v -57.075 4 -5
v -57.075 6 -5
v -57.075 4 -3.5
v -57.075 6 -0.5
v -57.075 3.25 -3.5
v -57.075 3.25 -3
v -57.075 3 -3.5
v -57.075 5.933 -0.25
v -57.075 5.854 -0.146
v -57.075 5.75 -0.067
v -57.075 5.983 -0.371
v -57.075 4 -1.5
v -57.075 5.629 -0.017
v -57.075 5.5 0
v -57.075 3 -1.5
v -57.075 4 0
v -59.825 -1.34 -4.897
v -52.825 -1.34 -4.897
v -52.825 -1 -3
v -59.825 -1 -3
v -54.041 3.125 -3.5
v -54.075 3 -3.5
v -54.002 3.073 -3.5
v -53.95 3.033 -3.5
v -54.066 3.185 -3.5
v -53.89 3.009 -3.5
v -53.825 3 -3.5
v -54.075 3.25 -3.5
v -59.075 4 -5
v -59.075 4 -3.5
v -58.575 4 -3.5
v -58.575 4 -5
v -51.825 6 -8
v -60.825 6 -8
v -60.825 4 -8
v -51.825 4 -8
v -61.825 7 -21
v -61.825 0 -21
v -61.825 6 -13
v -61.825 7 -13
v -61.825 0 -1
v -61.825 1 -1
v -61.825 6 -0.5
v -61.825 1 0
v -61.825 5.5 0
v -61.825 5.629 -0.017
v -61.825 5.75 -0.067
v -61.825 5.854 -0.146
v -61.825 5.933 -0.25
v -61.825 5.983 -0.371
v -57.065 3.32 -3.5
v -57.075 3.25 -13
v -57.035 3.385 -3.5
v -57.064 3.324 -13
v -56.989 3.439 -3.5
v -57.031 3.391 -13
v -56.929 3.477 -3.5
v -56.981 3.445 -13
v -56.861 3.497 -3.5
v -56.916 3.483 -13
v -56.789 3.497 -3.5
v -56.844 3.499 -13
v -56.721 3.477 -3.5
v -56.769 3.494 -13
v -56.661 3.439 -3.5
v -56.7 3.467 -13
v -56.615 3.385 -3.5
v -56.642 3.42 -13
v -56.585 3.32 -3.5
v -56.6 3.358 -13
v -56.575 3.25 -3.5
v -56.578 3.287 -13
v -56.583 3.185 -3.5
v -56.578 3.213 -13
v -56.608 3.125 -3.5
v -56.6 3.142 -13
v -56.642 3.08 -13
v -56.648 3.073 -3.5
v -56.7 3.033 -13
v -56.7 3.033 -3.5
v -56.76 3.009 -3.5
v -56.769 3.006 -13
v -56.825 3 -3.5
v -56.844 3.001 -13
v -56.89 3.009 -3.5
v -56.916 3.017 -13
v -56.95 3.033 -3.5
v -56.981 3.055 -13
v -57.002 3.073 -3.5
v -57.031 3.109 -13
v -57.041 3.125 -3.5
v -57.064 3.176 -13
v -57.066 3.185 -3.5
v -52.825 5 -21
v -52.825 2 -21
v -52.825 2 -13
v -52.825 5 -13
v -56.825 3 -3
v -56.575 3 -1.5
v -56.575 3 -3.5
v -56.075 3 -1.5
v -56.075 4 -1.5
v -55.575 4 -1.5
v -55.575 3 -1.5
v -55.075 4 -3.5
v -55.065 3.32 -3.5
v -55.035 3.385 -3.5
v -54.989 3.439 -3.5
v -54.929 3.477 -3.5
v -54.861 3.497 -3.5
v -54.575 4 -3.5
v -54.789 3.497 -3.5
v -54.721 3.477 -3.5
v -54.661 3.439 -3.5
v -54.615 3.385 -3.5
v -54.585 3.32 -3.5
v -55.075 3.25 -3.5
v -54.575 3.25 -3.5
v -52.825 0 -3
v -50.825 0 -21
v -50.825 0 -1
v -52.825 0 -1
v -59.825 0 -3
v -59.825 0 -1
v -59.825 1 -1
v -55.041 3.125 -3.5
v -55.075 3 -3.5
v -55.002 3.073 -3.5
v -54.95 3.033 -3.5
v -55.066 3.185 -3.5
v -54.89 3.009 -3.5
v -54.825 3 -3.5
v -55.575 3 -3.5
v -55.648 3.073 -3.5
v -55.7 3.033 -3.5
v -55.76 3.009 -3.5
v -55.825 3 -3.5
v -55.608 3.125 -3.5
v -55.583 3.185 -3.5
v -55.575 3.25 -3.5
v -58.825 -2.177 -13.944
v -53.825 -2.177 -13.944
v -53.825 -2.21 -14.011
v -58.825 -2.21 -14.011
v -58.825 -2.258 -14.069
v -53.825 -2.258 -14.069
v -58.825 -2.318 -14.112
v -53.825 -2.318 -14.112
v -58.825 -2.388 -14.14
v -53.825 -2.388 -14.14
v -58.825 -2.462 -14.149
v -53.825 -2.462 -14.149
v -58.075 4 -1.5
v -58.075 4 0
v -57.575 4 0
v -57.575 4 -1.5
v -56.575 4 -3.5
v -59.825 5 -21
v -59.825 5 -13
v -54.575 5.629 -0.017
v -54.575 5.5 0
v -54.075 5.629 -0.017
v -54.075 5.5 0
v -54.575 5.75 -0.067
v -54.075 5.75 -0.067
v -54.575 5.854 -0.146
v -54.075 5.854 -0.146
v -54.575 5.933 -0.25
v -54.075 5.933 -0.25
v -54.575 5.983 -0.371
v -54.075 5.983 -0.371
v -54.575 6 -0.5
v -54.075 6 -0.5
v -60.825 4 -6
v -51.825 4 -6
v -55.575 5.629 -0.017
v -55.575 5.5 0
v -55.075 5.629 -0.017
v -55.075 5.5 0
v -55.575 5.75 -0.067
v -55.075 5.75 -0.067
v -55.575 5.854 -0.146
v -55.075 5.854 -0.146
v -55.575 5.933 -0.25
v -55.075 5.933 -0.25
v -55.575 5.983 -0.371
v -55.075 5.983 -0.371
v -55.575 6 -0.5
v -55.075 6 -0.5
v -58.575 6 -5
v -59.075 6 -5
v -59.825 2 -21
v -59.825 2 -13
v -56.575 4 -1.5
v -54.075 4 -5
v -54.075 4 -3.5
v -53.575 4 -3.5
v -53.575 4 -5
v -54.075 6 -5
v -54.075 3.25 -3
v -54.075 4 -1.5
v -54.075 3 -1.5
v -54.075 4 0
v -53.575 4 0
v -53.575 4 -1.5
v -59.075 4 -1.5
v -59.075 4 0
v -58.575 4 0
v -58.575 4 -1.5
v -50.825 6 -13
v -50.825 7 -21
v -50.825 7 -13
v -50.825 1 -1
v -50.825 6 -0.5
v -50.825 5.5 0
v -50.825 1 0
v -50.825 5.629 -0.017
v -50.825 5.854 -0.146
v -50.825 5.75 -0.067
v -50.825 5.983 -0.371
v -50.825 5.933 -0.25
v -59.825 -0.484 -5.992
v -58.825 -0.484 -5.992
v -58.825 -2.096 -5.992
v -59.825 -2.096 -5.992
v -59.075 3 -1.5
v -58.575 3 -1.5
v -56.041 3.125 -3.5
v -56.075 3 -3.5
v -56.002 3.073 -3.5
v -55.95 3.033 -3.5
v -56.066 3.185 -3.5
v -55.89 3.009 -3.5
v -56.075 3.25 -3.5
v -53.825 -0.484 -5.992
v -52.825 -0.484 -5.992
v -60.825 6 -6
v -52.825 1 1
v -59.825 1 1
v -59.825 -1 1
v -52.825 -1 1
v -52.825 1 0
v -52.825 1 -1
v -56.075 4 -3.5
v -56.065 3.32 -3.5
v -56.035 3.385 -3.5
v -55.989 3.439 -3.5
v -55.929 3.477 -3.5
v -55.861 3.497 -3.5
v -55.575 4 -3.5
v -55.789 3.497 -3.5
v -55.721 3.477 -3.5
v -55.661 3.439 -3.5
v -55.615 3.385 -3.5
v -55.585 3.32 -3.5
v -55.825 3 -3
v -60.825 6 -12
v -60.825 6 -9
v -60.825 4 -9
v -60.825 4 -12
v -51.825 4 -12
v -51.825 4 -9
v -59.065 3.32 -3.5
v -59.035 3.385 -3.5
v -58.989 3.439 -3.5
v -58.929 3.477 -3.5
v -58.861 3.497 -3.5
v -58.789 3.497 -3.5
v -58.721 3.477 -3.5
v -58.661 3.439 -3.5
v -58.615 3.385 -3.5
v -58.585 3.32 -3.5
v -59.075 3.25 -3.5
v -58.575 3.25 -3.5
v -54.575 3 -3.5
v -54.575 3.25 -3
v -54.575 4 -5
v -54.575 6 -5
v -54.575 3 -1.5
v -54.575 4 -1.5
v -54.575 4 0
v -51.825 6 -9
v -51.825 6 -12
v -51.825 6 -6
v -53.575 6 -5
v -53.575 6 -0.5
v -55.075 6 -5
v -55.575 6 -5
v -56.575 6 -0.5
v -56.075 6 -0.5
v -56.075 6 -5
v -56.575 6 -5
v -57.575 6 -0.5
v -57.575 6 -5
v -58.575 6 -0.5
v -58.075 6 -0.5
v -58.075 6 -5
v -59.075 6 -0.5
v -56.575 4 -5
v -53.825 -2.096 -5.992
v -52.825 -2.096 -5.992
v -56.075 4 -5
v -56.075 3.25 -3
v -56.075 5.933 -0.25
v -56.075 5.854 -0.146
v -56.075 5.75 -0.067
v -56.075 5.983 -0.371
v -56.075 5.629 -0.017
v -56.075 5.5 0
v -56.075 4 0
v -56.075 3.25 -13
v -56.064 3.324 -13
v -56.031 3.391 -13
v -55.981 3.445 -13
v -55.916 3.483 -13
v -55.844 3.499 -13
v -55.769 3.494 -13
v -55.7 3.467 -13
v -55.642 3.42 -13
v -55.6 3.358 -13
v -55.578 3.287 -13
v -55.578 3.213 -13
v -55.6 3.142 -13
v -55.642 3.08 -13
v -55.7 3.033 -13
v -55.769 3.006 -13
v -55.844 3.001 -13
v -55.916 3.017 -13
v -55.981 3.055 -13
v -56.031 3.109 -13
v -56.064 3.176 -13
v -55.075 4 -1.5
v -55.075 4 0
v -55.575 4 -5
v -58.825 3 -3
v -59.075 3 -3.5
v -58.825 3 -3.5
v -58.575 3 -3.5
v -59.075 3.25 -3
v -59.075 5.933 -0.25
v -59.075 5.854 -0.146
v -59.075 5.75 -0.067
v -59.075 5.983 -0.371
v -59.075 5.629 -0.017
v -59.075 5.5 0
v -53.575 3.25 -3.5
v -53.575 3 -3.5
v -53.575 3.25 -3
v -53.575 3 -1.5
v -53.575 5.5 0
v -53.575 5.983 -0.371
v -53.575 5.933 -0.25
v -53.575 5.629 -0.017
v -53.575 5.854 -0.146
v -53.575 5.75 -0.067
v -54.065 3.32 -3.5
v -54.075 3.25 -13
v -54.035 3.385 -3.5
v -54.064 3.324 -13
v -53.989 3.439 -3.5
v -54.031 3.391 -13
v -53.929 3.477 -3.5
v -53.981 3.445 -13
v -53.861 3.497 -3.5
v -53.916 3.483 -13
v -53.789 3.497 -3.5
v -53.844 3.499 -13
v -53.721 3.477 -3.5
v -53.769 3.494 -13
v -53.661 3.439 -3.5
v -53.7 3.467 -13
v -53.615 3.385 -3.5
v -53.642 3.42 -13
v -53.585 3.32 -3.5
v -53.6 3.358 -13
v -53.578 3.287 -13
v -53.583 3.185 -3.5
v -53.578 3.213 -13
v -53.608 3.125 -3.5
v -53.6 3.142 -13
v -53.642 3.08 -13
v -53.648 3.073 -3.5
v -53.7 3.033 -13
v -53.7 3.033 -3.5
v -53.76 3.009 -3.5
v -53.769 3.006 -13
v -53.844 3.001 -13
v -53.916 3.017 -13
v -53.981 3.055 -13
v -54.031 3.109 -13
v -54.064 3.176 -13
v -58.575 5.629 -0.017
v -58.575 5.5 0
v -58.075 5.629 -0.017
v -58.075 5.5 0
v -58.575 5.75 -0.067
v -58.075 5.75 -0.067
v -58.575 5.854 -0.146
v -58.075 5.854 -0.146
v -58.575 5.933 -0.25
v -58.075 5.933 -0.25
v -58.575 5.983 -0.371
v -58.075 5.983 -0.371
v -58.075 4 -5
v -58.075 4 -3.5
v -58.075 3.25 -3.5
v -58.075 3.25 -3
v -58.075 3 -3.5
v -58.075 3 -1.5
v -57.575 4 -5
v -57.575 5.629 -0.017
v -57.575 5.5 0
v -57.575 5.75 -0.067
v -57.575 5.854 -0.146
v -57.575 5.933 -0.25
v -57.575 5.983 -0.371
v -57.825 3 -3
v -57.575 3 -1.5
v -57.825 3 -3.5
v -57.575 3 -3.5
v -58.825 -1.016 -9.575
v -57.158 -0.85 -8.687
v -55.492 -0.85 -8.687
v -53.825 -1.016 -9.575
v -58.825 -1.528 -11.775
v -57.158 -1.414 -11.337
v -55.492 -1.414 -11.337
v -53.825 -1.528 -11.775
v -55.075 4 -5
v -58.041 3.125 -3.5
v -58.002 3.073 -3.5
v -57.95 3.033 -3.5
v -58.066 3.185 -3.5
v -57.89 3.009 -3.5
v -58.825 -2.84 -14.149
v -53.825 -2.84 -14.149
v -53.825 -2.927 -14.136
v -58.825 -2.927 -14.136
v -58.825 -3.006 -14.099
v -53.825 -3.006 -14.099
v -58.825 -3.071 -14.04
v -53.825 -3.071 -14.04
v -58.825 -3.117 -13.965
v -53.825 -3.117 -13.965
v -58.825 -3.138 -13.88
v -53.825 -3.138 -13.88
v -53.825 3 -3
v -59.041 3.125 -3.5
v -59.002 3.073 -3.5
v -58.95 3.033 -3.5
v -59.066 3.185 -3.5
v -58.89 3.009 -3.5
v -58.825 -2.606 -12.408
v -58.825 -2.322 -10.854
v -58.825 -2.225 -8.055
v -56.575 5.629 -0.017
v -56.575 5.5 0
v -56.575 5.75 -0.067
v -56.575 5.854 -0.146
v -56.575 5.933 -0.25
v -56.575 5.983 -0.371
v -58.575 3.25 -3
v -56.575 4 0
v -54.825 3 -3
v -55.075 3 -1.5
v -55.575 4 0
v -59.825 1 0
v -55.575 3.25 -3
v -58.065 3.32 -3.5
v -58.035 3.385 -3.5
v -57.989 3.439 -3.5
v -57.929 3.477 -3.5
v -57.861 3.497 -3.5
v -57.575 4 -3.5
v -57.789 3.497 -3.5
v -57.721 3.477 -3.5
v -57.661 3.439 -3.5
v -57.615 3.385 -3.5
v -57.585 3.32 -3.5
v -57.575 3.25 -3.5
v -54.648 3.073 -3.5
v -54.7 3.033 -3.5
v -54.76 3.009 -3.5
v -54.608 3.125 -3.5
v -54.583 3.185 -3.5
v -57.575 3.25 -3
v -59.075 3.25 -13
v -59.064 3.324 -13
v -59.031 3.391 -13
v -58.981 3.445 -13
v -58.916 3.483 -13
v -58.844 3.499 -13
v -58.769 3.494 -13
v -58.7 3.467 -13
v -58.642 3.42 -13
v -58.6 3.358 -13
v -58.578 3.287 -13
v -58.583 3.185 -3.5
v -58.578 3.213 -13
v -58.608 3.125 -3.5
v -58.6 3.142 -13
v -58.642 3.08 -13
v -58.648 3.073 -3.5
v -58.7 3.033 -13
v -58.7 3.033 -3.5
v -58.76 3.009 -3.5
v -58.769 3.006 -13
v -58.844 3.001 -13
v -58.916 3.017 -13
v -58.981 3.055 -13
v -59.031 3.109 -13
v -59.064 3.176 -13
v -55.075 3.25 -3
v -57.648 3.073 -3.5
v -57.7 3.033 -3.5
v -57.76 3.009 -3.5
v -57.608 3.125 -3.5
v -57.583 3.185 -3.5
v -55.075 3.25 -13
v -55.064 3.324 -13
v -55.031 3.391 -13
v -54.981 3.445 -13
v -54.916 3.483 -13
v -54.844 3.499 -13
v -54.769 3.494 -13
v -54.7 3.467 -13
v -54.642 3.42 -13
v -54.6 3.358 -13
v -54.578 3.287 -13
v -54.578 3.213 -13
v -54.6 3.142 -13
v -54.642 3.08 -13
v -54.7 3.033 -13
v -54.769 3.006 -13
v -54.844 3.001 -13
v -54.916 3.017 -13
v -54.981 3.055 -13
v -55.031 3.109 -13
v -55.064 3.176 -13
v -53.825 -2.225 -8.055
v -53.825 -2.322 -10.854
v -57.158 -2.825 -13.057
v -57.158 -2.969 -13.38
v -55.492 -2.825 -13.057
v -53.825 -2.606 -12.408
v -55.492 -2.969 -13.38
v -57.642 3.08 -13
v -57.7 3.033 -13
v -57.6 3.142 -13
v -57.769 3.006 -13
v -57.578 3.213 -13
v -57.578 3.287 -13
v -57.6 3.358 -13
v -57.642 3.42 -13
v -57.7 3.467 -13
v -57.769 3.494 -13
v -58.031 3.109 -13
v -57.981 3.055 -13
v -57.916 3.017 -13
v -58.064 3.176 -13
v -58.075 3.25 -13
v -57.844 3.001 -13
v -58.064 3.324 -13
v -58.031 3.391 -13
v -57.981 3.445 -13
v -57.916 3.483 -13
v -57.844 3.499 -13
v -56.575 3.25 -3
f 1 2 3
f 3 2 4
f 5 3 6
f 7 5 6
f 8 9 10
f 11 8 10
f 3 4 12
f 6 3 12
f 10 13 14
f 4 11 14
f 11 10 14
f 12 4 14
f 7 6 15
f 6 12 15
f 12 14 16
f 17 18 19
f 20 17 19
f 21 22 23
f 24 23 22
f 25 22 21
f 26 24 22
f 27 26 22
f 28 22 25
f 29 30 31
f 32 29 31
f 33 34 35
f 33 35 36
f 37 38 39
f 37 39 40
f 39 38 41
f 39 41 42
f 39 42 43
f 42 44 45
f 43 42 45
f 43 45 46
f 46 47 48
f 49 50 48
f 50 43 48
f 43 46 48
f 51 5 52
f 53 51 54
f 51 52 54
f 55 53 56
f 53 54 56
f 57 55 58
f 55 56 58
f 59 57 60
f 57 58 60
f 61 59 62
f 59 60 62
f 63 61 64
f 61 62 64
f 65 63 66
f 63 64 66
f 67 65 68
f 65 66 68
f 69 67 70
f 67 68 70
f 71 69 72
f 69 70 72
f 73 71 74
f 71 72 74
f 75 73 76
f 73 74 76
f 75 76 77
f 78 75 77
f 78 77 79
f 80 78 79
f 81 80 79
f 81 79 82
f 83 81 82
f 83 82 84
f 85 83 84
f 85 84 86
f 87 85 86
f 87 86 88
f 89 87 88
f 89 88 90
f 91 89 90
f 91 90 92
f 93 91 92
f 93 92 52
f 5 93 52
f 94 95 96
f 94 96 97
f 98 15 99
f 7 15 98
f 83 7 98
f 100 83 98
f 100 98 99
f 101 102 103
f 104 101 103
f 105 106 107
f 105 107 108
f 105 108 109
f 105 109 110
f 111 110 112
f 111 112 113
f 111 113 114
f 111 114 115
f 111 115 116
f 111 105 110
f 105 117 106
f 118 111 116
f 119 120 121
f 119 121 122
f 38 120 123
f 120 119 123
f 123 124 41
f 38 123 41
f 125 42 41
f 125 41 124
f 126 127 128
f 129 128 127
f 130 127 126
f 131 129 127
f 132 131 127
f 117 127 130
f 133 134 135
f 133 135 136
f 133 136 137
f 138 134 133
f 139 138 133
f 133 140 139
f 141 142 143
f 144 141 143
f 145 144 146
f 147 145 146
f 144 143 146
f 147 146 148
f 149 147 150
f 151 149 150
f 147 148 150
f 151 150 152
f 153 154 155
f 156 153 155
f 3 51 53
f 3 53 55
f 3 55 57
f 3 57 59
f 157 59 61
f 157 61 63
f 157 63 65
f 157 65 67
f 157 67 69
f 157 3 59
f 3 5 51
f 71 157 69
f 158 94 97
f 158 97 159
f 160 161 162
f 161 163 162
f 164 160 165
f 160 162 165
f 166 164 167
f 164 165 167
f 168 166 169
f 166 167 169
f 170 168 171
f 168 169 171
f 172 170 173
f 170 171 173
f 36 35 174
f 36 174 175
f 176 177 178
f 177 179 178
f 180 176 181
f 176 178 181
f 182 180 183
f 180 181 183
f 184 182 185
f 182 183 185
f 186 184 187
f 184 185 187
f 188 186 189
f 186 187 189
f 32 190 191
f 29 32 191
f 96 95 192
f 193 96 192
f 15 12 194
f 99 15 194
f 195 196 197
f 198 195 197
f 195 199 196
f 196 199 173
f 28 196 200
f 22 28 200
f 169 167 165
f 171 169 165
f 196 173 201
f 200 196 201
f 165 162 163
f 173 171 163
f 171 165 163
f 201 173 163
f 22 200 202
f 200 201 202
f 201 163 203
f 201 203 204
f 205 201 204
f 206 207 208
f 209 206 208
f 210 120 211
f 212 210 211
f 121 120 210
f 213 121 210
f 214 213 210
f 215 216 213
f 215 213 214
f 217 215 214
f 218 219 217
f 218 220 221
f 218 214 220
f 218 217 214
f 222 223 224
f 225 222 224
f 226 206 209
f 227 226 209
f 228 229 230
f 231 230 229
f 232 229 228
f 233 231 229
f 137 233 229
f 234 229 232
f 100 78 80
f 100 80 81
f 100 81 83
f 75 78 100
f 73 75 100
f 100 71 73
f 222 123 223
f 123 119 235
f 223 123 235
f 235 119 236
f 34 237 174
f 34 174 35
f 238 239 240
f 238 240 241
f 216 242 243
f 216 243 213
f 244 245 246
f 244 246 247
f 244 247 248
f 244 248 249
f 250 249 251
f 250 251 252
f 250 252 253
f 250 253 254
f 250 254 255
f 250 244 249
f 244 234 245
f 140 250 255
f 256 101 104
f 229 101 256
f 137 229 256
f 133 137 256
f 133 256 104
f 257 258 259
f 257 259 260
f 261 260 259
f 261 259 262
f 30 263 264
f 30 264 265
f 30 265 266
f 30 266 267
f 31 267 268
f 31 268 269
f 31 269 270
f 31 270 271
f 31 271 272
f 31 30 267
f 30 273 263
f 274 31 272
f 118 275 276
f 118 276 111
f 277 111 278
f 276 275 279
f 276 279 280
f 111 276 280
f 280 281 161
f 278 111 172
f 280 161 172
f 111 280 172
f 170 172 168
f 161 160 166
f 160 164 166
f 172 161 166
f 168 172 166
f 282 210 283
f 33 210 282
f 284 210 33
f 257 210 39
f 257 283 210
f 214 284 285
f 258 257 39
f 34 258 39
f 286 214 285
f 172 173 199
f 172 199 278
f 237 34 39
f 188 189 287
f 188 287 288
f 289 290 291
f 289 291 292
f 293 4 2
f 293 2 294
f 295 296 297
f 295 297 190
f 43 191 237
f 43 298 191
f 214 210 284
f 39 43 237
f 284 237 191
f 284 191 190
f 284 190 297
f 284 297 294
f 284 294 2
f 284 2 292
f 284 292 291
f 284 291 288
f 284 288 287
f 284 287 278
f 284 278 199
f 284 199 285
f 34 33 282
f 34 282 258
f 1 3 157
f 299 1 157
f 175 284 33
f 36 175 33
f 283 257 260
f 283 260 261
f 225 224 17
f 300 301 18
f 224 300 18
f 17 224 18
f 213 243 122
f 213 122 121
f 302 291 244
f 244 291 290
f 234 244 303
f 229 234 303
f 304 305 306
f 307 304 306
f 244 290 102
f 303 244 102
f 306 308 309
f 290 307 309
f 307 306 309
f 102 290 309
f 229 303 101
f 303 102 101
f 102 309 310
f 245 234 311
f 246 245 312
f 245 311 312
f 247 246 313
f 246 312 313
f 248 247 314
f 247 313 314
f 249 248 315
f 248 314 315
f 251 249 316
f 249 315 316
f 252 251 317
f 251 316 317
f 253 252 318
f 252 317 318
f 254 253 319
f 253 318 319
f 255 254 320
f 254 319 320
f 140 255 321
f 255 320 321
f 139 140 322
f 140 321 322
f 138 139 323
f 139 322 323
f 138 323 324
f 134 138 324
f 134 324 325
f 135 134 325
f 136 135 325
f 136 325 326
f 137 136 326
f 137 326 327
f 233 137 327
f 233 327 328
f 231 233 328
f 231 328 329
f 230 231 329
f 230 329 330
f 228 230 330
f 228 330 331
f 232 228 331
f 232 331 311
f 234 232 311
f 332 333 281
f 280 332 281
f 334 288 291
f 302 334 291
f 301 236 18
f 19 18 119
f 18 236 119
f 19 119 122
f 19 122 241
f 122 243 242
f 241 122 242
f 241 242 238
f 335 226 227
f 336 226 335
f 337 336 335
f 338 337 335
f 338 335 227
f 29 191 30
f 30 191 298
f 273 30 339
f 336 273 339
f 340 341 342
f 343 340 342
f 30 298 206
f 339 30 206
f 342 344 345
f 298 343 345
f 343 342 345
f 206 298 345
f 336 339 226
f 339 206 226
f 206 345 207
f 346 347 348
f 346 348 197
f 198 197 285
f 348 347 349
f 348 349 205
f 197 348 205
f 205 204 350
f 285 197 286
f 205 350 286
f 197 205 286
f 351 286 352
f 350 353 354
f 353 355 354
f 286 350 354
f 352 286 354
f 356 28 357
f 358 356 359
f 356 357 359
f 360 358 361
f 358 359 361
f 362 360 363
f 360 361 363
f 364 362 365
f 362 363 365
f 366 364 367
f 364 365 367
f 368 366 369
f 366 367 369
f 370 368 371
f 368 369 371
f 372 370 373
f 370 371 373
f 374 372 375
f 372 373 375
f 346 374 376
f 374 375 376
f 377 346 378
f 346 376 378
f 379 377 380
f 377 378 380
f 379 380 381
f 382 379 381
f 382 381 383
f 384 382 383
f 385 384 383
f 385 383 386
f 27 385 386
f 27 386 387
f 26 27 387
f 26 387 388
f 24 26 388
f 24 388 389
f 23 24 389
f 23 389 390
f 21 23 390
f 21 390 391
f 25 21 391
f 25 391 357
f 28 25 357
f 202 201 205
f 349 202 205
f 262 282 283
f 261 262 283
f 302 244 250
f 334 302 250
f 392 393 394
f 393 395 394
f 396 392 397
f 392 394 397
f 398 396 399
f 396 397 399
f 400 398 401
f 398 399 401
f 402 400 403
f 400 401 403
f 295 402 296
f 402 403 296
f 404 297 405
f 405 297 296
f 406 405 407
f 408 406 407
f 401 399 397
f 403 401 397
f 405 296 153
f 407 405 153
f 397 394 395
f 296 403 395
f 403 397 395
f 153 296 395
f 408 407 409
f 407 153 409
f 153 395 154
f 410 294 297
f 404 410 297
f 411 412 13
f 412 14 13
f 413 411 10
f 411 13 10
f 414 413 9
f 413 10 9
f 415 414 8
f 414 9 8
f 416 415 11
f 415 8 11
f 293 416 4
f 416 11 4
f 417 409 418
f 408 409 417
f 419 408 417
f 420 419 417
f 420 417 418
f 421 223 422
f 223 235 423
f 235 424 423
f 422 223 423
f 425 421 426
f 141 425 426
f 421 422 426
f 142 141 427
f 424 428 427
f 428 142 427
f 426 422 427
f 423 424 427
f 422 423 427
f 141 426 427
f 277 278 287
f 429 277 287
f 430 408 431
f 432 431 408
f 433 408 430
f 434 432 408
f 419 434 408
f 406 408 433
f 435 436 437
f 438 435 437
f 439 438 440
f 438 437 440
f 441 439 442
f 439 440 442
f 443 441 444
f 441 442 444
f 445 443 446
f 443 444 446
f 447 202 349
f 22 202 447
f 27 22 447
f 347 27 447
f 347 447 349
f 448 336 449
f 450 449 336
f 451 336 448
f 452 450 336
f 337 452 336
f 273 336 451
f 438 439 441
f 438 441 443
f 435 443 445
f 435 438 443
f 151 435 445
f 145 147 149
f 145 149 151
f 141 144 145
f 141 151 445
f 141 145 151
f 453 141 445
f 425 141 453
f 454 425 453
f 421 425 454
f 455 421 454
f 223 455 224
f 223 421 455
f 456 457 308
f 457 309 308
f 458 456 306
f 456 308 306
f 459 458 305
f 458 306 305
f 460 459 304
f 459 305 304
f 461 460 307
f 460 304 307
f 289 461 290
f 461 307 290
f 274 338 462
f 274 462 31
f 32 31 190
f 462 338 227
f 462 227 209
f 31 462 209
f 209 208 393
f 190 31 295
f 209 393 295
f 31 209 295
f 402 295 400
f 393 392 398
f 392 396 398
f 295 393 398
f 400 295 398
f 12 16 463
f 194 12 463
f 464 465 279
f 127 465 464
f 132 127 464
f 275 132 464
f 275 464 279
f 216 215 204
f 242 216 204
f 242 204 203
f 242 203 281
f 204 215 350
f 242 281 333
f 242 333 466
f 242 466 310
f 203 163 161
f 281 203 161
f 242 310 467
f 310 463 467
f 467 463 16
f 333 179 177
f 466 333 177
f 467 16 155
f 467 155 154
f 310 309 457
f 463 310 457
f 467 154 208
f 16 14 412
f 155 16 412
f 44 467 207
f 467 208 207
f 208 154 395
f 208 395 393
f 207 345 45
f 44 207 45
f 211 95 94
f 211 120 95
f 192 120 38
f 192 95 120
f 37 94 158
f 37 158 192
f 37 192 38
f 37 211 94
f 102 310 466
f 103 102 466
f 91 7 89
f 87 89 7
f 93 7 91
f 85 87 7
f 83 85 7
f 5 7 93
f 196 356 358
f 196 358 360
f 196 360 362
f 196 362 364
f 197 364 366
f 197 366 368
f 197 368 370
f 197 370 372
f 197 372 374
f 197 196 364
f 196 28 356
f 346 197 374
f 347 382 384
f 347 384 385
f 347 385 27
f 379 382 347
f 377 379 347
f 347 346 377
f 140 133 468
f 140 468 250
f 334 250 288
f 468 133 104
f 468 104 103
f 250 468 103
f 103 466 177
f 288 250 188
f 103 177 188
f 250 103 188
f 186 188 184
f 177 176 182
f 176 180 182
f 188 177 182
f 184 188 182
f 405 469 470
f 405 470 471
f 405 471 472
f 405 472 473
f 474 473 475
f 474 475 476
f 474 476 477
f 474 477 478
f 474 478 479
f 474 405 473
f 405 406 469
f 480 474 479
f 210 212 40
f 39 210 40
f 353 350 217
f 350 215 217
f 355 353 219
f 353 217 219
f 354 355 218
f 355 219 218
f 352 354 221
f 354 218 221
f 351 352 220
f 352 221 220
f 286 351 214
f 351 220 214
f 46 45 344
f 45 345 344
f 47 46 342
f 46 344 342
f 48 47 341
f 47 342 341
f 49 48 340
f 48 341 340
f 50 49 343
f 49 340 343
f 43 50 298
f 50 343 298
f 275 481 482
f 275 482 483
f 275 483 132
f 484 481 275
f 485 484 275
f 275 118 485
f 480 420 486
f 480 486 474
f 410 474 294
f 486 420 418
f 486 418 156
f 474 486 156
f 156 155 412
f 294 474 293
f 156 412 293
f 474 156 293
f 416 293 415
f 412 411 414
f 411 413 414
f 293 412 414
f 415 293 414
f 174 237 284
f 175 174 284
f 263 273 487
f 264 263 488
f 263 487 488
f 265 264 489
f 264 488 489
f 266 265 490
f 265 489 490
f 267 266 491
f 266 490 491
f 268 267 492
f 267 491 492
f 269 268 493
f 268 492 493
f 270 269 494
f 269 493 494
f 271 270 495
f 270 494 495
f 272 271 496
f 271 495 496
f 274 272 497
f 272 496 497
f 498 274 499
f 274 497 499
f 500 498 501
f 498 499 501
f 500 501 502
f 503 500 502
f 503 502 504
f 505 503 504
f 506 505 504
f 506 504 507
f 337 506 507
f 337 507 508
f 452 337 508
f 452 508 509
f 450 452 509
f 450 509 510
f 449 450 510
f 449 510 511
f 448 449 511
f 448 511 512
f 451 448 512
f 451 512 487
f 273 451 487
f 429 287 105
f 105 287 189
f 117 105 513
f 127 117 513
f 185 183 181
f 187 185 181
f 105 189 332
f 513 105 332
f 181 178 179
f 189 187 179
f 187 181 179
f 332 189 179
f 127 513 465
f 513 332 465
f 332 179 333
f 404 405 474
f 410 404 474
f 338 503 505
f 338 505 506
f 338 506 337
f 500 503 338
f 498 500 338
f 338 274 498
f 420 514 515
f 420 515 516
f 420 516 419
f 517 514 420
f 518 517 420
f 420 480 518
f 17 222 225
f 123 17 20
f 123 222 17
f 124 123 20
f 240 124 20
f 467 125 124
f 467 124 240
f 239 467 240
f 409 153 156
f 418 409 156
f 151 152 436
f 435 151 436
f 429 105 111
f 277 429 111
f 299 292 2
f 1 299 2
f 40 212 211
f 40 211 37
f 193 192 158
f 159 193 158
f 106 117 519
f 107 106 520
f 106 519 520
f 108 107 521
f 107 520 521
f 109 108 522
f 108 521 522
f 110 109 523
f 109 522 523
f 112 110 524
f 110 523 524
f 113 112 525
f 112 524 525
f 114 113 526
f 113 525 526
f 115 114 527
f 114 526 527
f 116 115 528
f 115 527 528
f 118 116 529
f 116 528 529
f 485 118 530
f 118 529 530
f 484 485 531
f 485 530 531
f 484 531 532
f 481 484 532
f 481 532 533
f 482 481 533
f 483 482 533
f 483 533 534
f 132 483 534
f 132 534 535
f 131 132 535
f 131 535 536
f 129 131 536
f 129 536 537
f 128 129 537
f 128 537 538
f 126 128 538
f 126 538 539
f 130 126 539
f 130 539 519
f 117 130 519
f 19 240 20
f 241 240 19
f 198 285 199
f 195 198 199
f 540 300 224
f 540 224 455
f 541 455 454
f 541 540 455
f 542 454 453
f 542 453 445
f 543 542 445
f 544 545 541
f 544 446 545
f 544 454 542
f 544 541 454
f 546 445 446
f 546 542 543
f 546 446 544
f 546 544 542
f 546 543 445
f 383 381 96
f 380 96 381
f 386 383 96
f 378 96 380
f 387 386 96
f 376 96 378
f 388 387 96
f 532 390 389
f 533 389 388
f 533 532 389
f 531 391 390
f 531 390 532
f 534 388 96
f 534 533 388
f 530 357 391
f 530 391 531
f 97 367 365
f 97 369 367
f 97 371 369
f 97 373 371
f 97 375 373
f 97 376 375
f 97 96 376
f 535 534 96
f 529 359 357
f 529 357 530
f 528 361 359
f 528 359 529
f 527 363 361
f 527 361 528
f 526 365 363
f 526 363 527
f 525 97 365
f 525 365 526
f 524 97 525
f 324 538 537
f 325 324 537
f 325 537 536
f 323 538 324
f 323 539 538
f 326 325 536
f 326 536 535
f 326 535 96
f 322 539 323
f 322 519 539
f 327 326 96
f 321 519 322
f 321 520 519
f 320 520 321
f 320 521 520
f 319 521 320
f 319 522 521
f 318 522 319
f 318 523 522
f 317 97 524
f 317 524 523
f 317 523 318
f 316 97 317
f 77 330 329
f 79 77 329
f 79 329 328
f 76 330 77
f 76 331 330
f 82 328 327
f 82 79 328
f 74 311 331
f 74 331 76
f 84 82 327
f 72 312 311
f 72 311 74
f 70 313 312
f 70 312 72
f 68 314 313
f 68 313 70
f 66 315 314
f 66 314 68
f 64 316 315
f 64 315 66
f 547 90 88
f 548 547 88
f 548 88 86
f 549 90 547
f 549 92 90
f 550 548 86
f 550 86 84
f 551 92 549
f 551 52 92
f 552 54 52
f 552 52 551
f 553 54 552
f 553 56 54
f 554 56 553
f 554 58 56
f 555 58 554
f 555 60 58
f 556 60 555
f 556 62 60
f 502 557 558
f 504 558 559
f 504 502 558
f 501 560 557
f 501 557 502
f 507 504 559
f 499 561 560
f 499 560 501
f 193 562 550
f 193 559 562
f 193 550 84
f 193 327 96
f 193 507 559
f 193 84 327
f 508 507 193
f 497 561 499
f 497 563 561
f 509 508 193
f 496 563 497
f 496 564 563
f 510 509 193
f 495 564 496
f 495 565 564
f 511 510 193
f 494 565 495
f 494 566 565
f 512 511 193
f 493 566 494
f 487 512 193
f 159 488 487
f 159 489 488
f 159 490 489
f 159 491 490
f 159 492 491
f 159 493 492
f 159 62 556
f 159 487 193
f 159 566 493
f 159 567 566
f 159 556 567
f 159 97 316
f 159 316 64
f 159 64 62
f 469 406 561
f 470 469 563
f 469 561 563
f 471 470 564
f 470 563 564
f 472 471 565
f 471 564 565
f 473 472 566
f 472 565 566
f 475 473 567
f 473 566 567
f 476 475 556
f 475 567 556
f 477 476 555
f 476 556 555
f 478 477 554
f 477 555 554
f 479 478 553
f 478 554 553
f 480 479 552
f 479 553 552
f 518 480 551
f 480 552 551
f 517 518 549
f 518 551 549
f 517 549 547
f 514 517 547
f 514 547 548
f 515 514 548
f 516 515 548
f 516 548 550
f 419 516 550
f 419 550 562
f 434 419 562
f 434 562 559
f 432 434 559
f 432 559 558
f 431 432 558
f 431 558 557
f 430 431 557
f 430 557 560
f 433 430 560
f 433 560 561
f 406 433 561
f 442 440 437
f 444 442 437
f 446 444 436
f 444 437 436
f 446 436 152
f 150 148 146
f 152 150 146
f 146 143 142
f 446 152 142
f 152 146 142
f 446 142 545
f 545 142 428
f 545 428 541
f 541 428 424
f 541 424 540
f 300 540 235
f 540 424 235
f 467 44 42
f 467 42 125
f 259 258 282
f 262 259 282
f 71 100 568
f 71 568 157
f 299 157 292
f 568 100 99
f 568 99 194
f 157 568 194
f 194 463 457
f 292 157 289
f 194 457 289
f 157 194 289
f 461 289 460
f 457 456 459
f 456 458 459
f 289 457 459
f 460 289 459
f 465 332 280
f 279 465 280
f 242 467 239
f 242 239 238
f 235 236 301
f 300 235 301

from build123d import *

# Parameters (mm, degrees)
BOSS_EXTRUDE1_DEPTH = 5
SKETCH2_W           = 11
SKETCH2_H           = 6
BOSS_EXTRUDE2_DEPTH = 8
SKETCH3_W           = 9
SKETCH3_H           = 2
CUT_EXTRUDE1_DEPTH  = 2
SKETCH5_W           = 9
SKETCH5_H           = 3
CUT_EXTRUDE2_DEPTH  = 2
SKETCH7_W           = 11
SKETCH7_H           = 7
BOSS_EXTRUDE3_DEPTH = 8
SKETCH8_W           = 7
SKETCH8_H           = 2
BOSS_EXTRUDE4_DEPTH = 1
SKETCH9_W           = 2
SKETCH9_H           = 1
CUT_EXTRUDE3_DEPTH  = 1
SKETCH10_W          = 7
SKETCH10_H          = 3
BOSS_EXTRUDE5_DEPTH = 1
BOSS_EXTRUDE6_DEPTH = 7
BOSS_EXTRUDE7_DEPTH = 5
SKETCH14_W          = 0.5
SKETCH14_H          = 2
CUT_EXTRUDE4_DEPTH  = 1
SKETCH15_W          = 7
SKETCH15_H          = 3
CUT_EXTRUDE5_DEPTH  = 8
SKETCH16_R          = 0.25
CUT_EXTRUDE10_DEPTH = 10
FILLET1_R           = 0.5


with BuildPart() as part:
    # Sketch1 → Boss-Extrude1 (new body)
    with BuildSketch(Plane.XY):
        Polygon((-53.574922408, 6), (-50.824922408, 6), (-50.824922408, 0), (-61.824922408, 0), (-61.824922408, 6), (-59.074922408, 6), (-59.074922408, 4), (-58.574922408, 4), (-58.574922408, 6), (-58.074922408, 6), (-58.074922408, 4), (-57.574922408, 4), (-57.574922408, 6), (-57.074922408, 6), (-57.074922408, 4), (-56.574922408, 4), (-56.574922408, 6), (-56.074922408, 6), (-56.074922408, 4), (-55.574922408, 4), (-55.574922408, 6), (-55.074922408, 6), (-55.074922408, 4), (-54.574922408, 4), (-54.574922408, 6), (-54.074922408, 6), (-54.074922408, 4), (-53.574922408, 4), align=None)
    extrude(amount=-BOSS_EXTRUDE1_DEPTH)

    # Sketch2 → Boss-Extrude2 (add)
    with BuildSketch(Plane(origin=(0, 0, -5), x_dir=(-1, 0, 0), z_dir=(0, 0, -1))):
        with Locations((56.324922408, 3)):
            Rectangle(SKETCH2_W, SKETCH2_H)
    extrude(amount=BOSS_EXTRUDE2_DEPTH)

    # Sketch3 → Cut-Extrude1 (cut)
    with BuildSketch(Plane(origin=(0, 6, 0), x_dir=(1, 0, 0), z_dir=(0, 1, 0))):
        with Locations((-56.324922408, 7)):
            Rectangle(SKETCH3_W, SKETCH3_H)
    extrude(amount=-CUT_EXTRUDE1_DEPTH, mode=Mode.SUBTRACT)

    # Sketch5 → Cut-Extrude2 (cut)
    with BuildSketch(Plane(origin=(0, 6, 0), x_dir=(1, 0, 0), z_dir=(0, 1, 0))):
        with Locations((-56.324922408, 10.5)):
            Rectangle(SKETCH5_W, SKETCH5_H)
    extrude(amount=-CUT_EXTRUDE2_DEPTH, mode=Mode.SUBTRACT)

    # Sketch7 → Boss-Extrude3 (add)
    with BuildSketch(Plane(origin=(0, 0, -13), x_dir=(-1, 0, 0), z_dir=(0, 0, -1))):
        with Locations((56.324922408, 3.5)):
            Rectangle(SKETCH7_W, SKETCH7_H)
    extrude(amount=BOSS_EXTRUDE3_DEPTH)

    # Sketch8 → Boss-Extrude4 (add)
    with BuildSketch(Plane.XY):
        with Locations((-56.324922408, 0)):
            Rectangle(SKETCH8_W, SKETCH8_H)
    extrude(amount=BOSS_EXTRUDE4_DEPTH)

    # Sketch9 → Cut-Extrude3 (cut)
    with BuildSketch(Plane.XY):
        with Locations((-60.824922408, 0.5)):
            Rectangle(SKETCH9_W, SKETCH9_H)
        with Locations((-51.824922408, 0.5)):
            Rectangle(SKETCH9_W, SKETCH9_H)
    extrude(amount=-CUT_EXTRUDE3_DEPTH, mode=Mode.SUBTRACT)

    # Sketch10 → Boss-Extrude5 (add)
    with BuildSketch(Plane.XZ):
        with Locations((-56.324922408, -1.5)):
            Rectangle(SKETCH10_W, SKETCH10_H)
    extrude(amount=BOSS_EXTRUDE5_DEPTH)

    # Sketch12 → Boss-Extrude6 (add)
    with BuildSketch(Plane(origin=(-52.824922408, 0, 0), x_dir=(0, 0, -1), z_dir=(1, 0, 0))):
        Polygon((3, 0), (5.992424207, -0.484369133), (5.992424207, -2.095529726), (4.896502139, -1.339612629), (3, -1), align=None)
    extrude(amount=-BOSS_EXTRUDE6_DEPTH)

    # Sketch13 → Boss-Extrude7 (add)
    with BuildSketch(Plane(origin=(-53.824922408, 0, 0), x_dir=(0, 0, -1), z_dir=(1, 0, 0))):
        with BuildLine():
            Line((14.148954215, -2.461888554), (14.148954215, -2.839825861))
            ThreePointArc((14.148954215, -2.839825861), (14.071635021, -3.040856353), (13.87953249, -3.138263407))
            add(Edge.make_bspline(
                [(5.992424207, -2.095529726), (8.29118563, -2.416616876), (10.932584268, -1.908869196), (13.449456914, -2.990370177), (13.696503578, -3.157016773), (13.87953249, -3.138263407)],
                knots=[0, 0, 0, 0, 0.841667249, 0.882833834, 0.948247019, 0.948247019, 0.948247019, 0.948247019], degree=3))
            Line((5.992424207, -2.095529726), (5.992424207, -0.484369133))
            add(Edge.make_bspline(
                [(5.992424207, -0.484369133), (8.707741723, -0.750205277), (11.359938613, -1.314908717), (13.943929605, -2.177319274)],
                knots=[0, 0, 0, 0, 0.957734947, 0.957734947, 0.957734947, 0.957734947], degree=3))
            ThreePointArc((13.943929605, -2.177319274), (14.092359861, -2.28652125), (14.148954215, -2.461888554))
        make_face()
    extrude(amount=-BOSS_EXTRUDE7_DEPTH)

    # Sketch14 → Cut-Extrude4 (cut)
    with BuildSketch(Plane(origin=(0, 4, 0), x_dir=(1, 0, 0), z_dir=(0, 1, 0))):
        with Locations((-53.824922408, 2.5)):
            Rectangle(SKETCH14_W, SKETCH14_H)
        with Locations((-54.824922408, 2.5)):
            Rectangle(SKETCH14_W, SKETCH14_H)
        with Locations((-55.824922408, 2.5)):
            Rectangle(SKETCH14_W, SKETCH14_H)
        with Locations((-56.824922408, 2.5)):
            Rectangle(SKETCH14_W, SKETCH14_H)
        with Locations((-57.824922408, 2.5)):
            Rectangle(SKETCH14_W, SKETCH14_H)
        with Locations((-58.824922408, 2.5)):
            Rectangle(SKETCH14_W, SKETCH14_H)
    extrude(amount=-CUT_EXTRUDE4_DEPTH, mode=Mode.SUBTRACT)

    # Sketch15 → Cut-Extrude5 (cut)
    with BuildSketch(Plane(origin=(0, 0, -21), x_dir=(-1, 0, 0), z_dir=(0, 0, -1))):
        with Locations((56.324922408, 3.5)):
            Rectangle(SKETCH15_W, SKETCH15_H)
    extrude(amount=-CUT_EXTRUDE5_DEPTH, mode=Mode.SUBTRACT)

    # Sketch16 → Cut-Extrude10 (cut)
    with BuildSketch(Plane(origin=(0, 0, -13), x_dir=(-1, 0, 0), z_dir=(0, 0, -1))):
        with Locations((53.824922408, 3.25)):
            Circle(SKETCH16_R)
        with Locations((54.824922408, 3.25)):
            Circle(SKETCH16_R)
        with Locations((55.824922408, 3.25)):
            Circle(SKETCH16_R)
        with Locations((56.824922408, 3.25)):
            Circle(SKETCH16_R)
        with Locations((57.824922408, 3.25)):
            Circle(SKETCH16_R)
        with Locations((58.824922408, 3.25)):
            Circle(SKETCH16_R)
    extrude(amount=-CUT_EXTRUDE10_DEPTH, mode=Mode.SUBTRACT)

    # Fillet1
    fillet1_edges = [part.edges().sort_by_distance(p)[0] for p in [
        (-60.449922408, 6, 0),
        (-58.324922408, 6, 0),
        (-57.324922408, 6, 0),
        (-56.324922408, 6, 0),
        (-55.324922408, 6, 0),
        (-54.324922408, 6, 0),
        (-52.199922408, 6, 0),
    ]]
    fillet(fillet1_edges, radius=FILLET1_R)


solid = part.part
